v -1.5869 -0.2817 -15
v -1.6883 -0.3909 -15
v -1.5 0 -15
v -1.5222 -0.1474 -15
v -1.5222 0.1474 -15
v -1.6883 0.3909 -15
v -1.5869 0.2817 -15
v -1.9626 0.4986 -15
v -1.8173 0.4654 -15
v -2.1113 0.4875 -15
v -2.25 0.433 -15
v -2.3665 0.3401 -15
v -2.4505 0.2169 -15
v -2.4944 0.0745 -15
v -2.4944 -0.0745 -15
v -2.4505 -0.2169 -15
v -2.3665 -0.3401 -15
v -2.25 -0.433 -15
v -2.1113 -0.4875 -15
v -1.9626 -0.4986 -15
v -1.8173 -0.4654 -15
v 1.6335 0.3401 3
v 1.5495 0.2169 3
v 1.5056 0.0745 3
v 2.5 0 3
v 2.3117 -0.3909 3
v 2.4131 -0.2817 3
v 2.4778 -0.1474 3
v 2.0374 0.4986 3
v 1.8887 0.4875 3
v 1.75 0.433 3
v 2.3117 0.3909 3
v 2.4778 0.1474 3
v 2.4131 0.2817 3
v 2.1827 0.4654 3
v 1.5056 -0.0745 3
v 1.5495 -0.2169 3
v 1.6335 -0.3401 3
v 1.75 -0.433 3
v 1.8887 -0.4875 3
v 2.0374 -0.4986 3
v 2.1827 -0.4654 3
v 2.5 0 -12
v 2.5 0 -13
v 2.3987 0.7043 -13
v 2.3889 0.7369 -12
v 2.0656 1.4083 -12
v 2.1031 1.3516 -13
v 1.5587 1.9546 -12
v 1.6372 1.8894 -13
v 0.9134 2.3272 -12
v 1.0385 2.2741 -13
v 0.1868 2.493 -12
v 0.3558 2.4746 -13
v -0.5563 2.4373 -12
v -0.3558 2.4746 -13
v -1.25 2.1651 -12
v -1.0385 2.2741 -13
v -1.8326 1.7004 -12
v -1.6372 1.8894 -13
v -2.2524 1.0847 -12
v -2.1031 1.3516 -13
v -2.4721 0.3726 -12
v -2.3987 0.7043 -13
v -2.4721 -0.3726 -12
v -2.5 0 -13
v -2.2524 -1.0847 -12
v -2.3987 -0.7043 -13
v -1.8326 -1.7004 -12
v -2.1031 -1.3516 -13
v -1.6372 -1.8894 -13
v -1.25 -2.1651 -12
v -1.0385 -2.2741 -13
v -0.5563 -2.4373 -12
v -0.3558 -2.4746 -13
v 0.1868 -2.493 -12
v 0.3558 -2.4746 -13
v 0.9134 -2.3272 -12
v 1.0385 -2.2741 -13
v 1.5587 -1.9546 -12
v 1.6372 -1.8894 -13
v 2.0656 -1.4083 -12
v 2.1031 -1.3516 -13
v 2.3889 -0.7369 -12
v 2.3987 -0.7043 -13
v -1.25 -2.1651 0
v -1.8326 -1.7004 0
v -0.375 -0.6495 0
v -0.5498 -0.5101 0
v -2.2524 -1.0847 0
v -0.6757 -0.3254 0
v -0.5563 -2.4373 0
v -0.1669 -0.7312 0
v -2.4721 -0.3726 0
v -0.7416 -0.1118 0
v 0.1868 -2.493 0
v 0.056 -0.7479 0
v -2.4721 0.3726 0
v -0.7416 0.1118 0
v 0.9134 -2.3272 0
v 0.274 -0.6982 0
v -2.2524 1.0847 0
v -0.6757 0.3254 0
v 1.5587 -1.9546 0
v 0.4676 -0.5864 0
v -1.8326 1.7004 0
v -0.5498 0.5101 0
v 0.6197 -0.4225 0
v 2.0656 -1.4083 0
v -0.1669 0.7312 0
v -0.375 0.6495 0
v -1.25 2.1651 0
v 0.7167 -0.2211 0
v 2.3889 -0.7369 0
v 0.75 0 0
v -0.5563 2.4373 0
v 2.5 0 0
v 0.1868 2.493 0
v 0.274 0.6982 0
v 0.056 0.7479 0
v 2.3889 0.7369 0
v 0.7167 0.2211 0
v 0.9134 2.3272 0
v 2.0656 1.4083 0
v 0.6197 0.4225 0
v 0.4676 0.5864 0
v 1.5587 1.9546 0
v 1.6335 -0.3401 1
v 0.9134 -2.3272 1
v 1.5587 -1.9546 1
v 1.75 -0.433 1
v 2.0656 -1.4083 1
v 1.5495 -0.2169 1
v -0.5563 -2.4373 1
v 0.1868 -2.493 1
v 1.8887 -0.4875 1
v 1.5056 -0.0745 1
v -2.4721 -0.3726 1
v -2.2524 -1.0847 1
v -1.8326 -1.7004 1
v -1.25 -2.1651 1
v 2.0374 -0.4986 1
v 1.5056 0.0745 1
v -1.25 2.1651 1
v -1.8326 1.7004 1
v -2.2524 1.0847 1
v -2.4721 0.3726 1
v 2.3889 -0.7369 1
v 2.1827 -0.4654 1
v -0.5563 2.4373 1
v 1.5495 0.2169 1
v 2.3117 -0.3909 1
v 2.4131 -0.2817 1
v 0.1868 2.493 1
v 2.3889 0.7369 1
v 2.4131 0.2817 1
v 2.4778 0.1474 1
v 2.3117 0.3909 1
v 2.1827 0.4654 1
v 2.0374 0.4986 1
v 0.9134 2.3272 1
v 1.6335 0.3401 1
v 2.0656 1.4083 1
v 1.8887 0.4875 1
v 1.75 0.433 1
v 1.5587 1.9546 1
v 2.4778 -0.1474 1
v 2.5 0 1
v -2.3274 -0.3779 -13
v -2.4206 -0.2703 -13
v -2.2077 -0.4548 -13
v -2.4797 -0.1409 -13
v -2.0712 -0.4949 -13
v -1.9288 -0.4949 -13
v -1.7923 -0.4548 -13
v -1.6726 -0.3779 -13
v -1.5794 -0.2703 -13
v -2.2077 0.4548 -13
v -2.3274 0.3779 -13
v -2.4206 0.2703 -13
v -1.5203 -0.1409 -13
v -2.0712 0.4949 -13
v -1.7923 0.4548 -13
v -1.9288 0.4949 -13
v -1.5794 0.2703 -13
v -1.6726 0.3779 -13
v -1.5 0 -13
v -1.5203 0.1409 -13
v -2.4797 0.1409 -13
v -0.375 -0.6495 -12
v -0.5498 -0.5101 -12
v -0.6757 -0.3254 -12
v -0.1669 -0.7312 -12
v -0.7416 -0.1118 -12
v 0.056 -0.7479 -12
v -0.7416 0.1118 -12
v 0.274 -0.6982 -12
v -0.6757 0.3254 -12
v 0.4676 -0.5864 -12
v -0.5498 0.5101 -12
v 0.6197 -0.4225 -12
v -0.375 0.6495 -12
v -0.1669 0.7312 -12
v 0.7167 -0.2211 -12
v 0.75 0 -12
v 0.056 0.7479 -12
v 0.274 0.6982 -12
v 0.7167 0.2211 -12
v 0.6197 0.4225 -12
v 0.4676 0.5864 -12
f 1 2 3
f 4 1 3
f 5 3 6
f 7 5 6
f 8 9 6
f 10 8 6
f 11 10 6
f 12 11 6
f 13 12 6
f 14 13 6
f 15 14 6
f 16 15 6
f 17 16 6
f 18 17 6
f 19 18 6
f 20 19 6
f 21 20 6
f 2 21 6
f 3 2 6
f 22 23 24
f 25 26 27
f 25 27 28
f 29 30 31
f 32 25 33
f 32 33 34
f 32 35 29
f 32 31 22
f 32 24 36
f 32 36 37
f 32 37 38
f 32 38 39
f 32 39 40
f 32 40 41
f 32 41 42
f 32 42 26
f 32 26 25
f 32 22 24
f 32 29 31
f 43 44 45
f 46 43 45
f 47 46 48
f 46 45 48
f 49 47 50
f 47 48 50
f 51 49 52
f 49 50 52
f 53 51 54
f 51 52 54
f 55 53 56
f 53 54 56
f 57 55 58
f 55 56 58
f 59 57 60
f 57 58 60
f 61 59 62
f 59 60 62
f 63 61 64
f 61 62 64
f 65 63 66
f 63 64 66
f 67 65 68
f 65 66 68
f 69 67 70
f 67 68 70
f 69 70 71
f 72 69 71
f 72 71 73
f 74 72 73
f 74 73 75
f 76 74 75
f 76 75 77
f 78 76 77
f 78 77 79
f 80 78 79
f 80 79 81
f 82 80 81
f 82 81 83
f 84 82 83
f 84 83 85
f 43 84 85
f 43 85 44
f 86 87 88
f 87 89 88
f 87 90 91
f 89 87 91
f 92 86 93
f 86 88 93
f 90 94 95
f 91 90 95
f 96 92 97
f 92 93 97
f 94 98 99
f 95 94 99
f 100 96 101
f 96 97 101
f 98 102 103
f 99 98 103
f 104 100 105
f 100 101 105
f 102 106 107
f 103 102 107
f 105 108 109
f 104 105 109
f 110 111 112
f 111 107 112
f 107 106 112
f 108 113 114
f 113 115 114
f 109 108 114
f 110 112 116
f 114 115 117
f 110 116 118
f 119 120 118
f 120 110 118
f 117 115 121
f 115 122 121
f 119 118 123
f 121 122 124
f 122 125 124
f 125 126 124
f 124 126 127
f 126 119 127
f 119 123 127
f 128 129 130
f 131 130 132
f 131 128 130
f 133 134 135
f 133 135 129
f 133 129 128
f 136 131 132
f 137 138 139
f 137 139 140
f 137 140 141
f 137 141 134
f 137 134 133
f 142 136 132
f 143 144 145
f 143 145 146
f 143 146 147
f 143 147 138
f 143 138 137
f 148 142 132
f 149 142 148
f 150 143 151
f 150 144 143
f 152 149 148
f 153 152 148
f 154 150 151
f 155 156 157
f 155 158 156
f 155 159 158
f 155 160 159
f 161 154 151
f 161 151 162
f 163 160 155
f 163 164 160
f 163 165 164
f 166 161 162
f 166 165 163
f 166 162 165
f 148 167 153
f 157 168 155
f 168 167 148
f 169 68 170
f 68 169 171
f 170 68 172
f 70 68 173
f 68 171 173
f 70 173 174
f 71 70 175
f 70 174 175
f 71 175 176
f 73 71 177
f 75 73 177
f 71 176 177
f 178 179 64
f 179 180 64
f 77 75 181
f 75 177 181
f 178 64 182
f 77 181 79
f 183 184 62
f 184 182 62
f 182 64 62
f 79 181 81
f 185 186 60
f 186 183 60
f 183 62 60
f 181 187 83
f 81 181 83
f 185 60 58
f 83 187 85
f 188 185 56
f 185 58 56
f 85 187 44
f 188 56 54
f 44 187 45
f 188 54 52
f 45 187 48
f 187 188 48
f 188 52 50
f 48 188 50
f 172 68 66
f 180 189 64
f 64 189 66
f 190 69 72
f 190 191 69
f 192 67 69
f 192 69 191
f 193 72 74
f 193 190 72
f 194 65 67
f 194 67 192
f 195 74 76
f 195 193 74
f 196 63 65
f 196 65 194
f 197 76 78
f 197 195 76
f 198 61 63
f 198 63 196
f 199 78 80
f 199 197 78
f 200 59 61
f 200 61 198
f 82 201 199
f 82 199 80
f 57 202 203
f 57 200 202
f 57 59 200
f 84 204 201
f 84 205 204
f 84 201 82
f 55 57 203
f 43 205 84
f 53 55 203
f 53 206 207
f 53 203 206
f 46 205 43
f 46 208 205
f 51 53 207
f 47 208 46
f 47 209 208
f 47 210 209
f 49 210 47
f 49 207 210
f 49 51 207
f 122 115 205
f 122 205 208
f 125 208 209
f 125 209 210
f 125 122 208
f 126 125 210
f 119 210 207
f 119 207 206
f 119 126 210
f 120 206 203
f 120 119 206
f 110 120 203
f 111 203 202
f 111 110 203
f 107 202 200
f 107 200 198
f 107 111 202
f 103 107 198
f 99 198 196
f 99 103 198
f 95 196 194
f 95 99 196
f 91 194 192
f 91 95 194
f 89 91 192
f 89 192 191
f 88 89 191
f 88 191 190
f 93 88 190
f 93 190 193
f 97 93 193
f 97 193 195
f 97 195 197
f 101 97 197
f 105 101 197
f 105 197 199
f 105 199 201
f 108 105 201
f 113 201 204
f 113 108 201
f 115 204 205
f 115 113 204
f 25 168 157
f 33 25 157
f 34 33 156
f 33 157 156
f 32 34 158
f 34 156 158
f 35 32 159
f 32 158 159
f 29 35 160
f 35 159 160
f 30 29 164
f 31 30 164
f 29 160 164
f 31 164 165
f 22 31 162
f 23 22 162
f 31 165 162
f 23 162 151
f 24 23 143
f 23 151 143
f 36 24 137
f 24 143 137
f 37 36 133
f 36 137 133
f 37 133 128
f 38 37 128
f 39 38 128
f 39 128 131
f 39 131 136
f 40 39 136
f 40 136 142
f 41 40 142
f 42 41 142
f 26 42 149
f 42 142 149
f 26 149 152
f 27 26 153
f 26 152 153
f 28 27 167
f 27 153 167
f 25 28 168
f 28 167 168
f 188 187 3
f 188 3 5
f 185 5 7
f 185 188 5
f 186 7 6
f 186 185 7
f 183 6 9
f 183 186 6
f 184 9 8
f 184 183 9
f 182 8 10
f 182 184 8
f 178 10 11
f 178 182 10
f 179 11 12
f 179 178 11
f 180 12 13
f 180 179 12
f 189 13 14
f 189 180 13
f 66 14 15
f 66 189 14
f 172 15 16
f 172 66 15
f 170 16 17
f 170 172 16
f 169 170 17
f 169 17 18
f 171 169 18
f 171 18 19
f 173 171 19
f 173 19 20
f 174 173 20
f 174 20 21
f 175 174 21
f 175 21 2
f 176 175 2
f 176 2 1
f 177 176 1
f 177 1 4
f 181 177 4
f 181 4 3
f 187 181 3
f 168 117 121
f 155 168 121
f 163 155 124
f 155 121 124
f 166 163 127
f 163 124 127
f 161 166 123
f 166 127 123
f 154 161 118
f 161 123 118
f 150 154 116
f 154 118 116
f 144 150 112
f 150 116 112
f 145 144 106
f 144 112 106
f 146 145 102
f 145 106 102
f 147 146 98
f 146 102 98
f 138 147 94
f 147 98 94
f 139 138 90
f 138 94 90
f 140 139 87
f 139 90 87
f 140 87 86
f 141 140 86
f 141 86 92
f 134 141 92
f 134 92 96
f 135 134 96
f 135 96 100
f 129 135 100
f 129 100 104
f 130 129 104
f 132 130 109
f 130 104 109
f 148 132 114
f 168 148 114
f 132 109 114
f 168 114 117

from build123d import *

# Parameters (mm, degrees)
SKETCH1_R           = 2.5
BOSS_EXTRUDE1_DEPTH = 1
SKETCH1_3_R         = 0.75
BOSS_EXTRUDE2_DEPTH = 12
BOSS_EXTRUDE4_START = 1
SKETCH1_5_R         = 0.5
BOSS_EXTRUDE4_DEPTH = 2
BOSS_EXTRUDE6_START = -13
SKETCH1_7_R         = 2.5
BOSS_EXTRUDE6_DEPTH = 1
BOSS_EXTRUDE7_START = -13
SKETCH1_8_R         = 0.5
BOSS_EXTRUDE7_DEPTH = 2


with BuildPart() as part:
    # Sketch1 → Boss-Extrude1 (new body)
    with BuildSketch(Plane.XY):
        Circle(SKETCH1_R)
    extrude(amount=BOSS_EXTRUDE1_DEPTH)

    # Sketch1<3> → Boss-Extrude2 (add)
    with BuildSketch(Plane.XY):
        Circle(SKETCH1_3_R)
    extrude(amount=-BOSS_EXTRUDE2_DEPTH)

    # Sketch1<5> → Boss-Extrude4 (add)
    with BuildSketch(Plane.XY.offset(BOSS_EXTRUDE4_START)):
        with Locations((2, 0)):
            Circle(SKETCH1_5_R)
    extrude(amount=BOSS_EXTRUDE4_DEPTH)

    # Sketch1<7> → Boss-Extrude6 (add)
    with BuildSketch(Plane.XY.offset(BOSS_EXTRUDE6_START)):
        Circle(SKETCH1_7_R)
    extrude(amount=BOSS_EXTRUDE6_DEPTH)

    # Sketch1<8> → Boss-Extrude7 (add)
    with BuildSketch(Plane.XY.offset(BOSS_EXTRUDE7_START)):
        with Locations((-2, 0)):
            Circle(SKETCH1_8_R)
    extrude(amount=-BOSS_EXTRUDE7_DEPTH)


solid = part.part
